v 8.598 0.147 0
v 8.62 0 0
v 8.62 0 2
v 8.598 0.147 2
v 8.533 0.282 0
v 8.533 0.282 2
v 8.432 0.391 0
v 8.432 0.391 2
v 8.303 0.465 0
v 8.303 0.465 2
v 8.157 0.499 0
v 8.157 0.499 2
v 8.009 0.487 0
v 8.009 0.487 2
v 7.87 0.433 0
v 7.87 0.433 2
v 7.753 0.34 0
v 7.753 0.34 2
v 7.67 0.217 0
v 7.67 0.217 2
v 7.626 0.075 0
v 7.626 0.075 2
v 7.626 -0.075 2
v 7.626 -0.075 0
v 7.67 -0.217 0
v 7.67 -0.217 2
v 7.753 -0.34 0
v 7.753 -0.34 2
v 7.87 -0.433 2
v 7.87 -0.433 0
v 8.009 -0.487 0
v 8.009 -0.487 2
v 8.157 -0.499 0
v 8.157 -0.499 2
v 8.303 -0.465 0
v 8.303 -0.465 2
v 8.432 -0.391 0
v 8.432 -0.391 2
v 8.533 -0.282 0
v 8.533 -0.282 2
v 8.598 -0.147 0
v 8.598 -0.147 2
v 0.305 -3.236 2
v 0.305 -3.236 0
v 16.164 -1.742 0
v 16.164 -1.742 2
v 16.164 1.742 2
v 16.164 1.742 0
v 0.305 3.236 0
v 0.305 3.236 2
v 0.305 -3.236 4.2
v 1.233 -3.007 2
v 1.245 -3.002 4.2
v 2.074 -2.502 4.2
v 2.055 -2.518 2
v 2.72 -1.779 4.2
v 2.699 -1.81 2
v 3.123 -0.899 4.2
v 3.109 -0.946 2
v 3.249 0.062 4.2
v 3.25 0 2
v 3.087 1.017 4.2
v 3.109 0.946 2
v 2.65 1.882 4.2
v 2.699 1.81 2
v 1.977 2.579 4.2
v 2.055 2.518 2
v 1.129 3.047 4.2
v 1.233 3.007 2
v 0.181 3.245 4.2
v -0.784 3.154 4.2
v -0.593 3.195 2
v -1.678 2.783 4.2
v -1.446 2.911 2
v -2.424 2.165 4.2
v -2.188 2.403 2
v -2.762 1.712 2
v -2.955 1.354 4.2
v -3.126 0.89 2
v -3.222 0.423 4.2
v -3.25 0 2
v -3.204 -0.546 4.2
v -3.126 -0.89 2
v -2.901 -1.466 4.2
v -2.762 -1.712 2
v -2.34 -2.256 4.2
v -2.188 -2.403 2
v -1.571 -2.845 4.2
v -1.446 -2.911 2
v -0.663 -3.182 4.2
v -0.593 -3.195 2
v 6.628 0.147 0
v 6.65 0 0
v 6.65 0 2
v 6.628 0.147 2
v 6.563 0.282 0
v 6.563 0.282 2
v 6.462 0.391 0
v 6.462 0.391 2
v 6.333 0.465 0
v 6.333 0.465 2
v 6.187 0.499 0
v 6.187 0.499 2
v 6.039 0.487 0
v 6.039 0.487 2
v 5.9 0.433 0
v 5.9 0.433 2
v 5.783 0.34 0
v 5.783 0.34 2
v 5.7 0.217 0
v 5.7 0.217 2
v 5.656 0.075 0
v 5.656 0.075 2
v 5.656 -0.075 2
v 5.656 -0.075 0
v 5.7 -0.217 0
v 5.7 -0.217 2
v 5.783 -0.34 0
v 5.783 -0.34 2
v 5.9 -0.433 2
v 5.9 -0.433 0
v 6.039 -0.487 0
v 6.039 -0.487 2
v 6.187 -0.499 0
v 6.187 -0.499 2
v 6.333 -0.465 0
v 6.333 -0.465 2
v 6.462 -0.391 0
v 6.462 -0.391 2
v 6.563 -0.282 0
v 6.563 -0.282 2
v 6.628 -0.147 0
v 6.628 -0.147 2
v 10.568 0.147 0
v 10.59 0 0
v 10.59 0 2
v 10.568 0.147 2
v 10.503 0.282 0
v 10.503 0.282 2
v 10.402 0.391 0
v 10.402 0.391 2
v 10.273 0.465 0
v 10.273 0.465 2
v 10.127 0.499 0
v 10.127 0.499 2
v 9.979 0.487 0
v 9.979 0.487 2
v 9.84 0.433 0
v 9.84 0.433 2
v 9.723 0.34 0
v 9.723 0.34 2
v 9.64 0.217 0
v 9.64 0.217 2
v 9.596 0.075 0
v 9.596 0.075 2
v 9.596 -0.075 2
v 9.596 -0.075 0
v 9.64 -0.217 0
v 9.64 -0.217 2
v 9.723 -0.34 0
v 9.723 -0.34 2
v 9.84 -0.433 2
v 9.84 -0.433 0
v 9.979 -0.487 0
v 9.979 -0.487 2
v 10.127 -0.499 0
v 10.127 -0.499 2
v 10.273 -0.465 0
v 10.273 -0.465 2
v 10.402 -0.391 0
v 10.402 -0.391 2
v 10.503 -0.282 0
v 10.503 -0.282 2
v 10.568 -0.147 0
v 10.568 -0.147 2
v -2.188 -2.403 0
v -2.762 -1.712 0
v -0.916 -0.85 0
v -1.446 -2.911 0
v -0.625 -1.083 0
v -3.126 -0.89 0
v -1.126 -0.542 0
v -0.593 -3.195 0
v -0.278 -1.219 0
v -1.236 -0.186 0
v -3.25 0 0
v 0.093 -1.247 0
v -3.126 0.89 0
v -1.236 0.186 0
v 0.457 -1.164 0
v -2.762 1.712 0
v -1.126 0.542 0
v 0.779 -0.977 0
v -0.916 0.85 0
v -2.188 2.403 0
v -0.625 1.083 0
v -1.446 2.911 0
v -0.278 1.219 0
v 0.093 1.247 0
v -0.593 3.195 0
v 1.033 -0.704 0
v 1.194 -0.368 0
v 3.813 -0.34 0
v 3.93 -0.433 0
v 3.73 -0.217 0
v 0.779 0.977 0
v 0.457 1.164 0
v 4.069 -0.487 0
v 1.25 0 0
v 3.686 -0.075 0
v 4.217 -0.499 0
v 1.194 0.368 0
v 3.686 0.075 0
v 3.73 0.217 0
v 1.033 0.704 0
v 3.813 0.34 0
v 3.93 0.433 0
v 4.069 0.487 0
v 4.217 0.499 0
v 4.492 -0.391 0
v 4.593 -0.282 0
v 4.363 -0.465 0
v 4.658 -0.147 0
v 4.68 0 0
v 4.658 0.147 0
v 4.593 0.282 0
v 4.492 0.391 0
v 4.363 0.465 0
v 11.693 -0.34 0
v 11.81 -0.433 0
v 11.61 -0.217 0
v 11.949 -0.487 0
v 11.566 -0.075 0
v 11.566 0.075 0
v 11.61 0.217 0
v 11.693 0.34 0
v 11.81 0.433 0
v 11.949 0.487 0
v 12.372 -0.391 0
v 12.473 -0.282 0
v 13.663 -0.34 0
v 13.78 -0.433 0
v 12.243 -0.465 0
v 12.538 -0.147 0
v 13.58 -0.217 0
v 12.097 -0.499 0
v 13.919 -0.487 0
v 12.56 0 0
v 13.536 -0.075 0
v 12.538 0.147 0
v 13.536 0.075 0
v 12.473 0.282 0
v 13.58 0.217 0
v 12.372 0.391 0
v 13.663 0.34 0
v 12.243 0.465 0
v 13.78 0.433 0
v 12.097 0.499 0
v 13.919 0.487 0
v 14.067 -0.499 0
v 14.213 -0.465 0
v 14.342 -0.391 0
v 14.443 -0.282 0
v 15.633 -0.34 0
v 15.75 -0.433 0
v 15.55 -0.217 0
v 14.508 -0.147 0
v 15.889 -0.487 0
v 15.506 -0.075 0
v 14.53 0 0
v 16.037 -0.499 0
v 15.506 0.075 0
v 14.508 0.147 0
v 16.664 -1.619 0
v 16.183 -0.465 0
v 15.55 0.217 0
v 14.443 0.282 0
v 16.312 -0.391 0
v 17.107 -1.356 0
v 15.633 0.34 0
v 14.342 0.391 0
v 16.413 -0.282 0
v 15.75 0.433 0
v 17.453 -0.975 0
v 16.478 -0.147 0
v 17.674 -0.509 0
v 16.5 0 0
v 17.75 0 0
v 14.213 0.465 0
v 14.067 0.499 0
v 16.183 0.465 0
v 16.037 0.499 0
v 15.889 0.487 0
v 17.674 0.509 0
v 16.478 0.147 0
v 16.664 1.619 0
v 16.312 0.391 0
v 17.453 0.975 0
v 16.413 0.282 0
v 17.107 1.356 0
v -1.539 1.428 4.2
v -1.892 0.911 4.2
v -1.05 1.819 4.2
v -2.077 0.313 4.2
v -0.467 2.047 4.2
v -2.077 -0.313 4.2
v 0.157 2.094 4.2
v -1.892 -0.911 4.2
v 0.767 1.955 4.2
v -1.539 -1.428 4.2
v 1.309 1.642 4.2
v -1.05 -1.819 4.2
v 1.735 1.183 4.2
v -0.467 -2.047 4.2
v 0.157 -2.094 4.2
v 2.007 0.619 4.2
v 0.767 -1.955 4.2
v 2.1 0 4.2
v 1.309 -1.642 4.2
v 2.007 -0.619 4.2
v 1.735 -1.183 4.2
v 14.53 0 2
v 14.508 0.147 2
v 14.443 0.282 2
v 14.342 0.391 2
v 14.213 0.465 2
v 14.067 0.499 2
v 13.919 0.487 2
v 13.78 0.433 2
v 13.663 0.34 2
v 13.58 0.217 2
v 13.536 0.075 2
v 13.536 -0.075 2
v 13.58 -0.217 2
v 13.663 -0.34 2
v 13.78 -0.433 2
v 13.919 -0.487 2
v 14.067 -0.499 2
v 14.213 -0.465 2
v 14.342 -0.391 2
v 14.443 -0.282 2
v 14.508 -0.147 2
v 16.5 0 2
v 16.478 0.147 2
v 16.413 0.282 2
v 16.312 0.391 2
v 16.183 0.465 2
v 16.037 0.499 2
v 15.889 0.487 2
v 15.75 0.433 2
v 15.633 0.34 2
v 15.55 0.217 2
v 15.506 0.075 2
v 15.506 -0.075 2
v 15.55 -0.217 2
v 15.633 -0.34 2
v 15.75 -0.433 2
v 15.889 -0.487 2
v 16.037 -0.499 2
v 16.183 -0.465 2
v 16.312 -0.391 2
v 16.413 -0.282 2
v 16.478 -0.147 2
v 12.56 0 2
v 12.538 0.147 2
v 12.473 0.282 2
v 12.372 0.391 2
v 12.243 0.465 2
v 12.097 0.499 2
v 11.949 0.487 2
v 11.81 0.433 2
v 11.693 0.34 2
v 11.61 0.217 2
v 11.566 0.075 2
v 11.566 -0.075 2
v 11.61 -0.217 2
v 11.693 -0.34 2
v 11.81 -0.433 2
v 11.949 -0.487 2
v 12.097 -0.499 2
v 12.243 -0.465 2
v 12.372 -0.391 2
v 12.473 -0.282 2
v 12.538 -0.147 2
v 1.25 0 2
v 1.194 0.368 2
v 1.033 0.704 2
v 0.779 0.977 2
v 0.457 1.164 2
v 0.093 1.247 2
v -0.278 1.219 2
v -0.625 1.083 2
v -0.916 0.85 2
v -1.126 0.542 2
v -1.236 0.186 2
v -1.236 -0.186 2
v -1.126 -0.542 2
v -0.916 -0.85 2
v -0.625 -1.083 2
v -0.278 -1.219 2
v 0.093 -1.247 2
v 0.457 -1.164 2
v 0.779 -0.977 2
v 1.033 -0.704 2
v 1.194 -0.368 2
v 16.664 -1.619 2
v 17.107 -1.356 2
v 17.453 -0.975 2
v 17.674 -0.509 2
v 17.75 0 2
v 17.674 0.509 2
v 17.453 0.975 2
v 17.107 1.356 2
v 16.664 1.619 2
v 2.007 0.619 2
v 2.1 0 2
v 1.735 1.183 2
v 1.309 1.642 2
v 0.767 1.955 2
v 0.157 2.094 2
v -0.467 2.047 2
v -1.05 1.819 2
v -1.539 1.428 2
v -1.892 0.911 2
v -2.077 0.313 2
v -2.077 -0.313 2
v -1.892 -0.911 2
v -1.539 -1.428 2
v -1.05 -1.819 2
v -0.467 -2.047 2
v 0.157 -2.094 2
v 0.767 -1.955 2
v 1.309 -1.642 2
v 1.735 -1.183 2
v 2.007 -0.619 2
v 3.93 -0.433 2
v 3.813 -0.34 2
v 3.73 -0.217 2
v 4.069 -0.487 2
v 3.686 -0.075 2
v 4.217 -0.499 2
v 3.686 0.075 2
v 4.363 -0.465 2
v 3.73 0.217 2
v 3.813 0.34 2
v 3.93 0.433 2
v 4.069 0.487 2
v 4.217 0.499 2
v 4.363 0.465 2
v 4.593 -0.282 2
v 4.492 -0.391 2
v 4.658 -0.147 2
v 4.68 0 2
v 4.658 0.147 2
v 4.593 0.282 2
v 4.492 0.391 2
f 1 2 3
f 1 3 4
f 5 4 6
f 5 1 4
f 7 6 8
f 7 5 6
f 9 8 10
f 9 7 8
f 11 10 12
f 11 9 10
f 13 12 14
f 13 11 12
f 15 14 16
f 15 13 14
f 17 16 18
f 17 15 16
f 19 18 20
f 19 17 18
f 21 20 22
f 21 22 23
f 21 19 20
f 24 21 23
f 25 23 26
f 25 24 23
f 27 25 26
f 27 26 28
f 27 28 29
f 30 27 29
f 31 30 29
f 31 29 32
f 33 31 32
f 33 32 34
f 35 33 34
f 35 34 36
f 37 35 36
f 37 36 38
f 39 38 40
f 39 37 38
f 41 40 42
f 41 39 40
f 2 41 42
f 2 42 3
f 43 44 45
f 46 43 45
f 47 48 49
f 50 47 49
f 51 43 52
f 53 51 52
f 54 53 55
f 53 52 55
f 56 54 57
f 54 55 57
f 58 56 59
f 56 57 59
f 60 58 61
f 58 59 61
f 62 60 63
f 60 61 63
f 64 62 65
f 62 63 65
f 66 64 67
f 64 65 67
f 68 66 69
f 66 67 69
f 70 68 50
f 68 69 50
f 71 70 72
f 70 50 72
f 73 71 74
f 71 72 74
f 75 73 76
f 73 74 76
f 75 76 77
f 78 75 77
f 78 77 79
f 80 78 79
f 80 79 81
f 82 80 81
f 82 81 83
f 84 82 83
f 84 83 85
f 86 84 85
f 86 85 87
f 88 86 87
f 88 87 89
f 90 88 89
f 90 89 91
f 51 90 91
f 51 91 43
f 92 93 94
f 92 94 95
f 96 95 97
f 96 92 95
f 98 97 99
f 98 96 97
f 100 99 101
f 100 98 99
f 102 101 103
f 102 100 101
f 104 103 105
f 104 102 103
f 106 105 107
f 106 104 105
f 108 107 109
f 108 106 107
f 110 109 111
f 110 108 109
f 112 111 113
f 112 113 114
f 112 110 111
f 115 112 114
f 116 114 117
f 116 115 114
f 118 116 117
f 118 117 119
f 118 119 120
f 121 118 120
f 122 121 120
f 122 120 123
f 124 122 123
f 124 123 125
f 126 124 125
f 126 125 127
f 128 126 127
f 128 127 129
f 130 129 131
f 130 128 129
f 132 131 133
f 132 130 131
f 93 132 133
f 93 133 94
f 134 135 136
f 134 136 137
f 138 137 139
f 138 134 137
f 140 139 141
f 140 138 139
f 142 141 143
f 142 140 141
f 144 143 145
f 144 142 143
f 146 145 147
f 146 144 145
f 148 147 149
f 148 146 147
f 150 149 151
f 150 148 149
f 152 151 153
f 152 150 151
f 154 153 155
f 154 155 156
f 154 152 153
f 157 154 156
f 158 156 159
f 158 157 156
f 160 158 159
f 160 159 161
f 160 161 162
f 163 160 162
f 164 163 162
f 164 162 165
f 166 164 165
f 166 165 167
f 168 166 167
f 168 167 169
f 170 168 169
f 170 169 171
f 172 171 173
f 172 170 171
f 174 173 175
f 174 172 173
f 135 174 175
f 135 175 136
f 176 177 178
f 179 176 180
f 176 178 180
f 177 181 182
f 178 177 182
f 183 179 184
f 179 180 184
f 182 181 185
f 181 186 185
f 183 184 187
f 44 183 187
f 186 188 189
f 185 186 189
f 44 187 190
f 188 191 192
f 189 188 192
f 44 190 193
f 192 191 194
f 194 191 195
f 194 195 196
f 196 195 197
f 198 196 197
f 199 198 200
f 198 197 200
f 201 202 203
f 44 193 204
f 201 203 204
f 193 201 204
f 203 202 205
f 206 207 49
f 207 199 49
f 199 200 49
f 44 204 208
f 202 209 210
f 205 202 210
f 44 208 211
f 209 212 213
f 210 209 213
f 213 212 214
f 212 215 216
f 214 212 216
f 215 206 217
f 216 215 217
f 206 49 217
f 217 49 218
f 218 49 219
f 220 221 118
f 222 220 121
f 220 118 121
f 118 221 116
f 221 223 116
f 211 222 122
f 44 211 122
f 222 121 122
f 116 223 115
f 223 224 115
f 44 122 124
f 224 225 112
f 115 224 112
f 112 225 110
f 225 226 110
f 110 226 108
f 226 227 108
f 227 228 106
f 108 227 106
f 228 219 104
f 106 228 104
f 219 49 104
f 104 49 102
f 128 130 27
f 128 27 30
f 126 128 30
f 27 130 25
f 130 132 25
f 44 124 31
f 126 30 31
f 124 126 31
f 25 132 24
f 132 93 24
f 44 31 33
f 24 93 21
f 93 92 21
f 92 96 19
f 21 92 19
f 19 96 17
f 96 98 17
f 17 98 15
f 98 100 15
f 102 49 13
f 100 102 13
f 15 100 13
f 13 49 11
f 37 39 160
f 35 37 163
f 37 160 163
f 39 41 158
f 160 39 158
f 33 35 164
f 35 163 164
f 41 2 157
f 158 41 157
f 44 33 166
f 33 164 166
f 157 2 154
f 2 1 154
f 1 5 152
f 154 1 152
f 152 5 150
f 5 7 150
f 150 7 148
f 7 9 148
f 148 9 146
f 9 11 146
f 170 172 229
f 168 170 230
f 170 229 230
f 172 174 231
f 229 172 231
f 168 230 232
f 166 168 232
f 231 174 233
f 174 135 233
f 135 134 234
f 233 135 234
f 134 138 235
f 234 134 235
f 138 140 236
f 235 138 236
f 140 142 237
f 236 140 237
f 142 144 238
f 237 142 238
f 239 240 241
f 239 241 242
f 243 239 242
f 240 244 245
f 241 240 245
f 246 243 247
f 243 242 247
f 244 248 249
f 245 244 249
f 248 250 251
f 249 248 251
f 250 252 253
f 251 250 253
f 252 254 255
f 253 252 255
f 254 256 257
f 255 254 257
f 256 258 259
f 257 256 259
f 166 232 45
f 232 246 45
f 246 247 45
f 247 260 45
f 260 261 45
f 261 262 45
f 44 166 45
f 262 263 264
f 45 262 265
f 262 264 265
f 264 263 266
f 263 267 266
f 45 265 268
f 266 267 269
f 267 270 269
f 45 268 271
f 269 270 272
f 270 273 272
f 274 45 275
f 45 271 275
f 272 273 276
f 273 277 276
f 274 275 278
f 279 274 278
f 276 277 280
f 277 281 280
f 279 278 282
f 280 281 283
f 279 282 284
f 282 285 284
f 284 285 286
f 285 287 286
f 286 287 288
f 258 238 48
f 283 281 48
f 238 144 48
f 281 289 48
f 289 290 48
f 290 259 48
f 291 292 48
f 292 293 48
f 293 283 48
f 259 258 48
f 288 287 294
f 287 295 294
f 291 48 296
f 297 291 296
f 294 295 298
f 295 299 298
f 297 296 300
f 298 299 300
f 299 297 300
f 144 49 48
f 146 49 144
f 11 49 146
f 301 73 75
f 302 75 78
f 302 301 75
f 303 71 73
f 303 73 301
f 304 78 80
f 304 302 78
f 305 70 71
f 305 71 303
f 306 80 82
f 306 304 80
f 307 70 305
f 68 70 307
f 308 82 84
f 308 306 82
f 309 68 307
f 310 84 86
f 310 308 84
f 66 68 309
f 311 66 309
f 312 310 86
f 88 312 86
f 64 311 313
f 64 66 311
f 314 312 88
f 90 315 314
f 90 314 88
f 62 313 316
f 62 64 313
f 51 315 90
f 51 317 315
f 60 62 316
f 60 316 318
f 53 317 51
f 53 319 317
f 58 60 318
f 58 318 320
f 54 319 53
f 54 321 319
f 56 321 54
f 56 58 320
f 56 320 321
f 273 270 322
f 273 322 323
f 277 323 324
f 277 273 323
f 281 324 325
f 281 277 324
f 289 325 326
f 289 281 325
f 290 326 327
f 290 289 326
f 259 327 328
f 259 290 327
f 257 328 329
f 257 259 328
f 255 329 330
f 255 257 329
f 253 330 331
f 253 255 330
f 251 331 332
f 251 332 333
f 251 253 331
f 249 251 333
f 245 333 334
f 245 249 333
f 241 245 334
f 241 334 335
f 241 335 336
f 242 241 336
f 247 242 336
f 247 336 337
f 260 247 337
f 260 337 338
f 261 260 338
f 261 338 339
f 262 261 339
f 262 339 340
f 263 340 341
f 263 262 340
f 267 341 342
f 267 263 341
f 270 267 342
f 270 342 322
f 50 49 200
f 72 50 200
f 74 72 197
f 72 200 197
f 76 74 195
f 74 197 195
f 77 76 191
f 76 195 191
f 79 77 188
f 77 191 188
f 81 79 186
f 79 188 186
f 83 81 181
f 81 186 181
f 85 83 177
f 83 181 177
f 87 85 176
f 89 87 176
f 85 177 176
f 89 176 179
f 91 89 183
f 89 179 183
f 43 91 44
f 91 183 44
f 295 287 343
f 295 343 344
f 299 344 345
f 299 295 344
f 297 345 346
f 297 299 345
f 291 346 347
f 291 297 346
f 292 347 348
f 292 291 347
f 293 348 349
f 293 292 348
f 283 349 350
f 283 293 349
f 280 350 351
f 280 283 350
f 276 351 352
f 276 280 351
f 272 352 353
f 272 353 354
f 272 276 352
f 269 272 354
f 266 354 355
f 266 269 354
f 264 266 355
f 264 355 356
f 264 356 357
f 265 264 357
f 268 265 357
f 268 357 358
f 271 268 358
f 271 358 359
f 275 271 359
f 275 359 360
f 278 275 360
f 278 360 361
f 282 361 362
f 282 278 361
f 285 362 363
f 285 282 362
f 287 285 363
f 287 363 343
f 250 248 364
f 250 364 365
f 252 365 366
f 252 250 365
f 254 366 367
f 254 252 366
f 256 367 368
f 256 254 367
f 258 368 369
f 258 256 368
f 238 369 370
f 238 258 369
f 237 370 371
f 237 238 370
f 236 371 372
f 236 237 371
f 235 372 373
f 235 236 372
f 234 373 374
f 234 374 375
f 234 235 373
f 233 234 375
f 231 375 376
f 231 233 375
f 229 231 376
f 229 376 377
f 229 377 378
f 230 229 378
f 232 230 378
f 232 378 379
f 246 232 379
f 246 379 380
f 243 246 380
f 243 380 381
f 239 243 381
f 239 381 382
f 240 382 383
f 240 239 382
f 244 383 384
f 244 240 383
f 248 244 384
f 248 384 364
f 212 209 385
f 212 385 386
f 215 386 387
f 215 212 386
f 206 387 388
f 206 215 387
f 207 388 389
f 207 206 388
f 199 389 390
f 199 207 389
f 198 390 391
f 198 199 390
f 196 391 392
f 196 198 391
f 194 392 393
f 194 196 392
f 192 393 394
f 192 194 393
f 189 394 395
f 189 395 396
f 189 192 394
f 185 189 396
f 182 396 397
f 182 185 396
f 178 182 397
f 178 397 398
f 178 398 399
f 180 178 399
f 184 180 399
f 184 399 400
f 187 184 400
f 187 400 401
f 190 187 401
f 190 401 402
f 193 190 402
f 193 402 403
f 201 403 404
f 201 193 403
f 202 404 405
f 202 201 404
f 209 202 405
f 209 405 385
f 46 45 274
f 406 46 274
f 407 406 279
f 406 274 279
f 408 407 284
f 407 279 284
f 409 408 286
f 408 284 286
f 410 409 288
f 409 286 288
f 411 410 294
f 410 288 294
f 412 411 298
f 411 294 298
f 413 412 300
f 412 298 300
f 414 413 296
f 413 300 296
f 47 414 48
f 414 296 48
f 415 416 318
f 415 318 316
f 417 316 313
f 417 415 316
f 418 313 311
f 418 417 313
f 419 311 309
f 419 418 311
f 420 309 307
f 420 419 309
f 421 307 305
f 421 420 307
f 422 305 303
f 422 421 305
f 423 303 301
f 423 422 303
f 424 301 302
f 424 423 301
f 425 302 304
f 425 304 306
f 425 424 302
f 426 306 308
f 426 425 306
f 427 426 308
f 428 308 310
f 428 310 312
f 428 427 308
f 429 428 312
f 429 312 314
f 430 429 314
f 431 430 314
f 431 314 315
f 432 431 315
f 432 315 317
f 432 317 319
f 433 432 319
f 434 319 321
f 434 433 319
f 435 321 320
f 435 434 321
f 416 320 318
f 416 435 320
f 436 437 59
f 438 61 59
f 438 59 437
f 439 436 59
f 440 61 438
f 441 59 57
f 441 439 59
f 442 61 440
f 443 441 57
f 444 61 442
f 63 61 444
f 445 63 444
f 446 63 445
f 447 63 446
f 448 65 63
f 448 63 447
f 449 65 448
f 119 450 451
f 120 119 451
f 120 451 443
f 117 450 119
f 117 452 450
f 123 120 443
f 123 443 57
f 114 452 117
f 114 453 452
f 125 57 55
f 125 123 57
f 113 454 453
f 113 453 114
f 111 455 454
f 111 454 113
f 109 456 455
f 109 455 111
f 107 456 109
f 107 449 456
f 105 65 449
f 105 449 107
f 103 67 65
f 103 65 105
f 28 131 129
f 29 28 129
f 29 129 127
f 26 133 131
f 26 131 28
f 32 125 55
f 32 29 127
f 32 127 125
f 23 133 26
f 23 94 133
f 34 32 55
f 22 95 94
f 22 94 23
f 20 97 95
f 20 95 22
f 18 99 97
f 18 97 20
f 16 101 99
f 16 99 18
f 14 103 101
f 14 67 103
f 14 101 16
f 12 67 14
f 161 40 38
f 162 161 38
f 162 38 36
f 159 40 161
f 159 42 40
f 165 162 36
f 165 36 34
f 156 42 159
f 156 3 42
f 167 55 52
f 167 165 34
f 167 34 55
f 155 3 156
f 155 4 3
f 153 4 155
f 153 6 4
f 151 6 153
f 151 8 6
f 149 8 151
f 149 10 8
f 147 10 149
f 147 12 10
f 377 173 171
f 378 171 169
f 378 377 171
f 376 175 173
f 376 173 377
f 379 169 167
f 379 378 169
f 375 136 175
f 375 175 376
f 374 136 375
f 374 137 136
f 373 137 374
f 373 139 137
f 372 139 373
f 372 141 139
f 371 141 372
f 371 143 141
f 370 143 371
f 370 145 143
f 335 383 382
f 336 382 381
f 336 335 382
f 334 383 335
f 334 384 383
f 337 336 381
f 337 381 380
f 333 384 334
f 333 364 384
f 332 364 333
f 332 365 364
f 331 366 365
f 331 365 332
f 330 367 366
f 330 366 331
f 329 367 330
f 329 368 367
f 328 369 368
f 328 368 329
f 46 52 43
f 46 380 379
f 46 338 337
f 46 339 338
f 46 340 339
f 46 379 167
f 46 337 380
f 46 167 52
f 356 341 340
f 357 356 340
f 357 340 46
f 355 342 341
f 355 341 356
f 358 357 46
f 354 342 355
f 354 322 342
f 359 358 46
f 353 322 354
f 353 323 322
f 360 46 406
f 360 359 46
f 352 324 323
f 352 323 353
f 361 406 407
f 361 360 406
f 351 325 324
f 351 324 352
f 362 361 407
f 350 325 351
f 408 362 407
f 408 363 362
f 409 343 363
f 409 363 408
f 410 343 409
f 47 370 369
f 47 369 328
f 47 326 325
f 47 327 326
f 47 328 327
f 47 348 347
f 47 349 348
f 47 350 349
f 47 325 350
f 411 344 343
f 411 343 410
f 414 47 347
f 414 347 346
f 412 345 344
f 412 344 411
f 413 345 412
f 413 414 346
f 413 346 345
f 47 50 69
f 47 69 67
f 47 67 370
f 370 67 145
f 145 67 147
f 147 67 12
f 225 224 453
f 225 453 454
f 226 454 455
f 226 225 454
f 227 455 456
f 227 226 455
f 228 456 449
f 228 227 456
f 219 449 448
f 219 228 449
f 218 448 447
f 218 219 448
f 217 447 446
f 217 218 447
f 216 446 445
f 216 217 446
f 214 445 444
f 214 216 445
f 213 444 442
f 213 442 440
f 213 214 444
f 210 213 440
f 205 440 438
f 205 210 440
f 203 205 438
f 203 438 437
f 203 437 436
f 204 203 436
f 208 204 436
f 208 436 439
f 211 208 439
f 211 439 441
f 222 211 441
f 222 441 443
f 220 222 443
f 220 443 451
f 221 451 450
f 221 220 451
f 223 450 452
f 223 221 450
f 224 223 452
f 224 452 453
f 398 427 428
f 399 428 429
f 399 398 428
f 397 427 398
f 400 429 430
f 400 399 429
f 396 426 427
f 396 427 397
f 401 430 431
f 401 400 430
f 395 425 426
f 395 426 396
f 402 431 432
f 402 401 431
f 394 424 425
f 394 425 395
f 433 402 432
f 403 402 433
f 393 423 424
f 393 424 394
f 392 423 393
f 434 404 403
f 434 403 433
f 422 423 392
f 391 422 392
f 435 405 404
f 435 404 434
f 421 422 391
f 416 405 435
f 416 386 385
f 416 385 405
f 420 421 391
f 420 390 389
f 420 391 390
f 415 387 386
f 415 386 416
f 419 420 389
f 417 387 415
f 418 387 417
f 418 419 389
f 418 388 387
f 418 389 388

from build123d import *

# Parameters (mm, degrees)
ESBO_O1_R                = 1.25
ESBO_O1_R_2              = 0.5
RESSALTO_EXTRUS_O1_DEPTH = 2
ESBO_O2_R                = 3.25
ESBO_O2_R_2              = 2.1
RESSALTO_EXTRUS_O2_DEPTH = 2.2


with BuildPart() as part:
    # Esboço1 → Ressalto-extrusão1 (new body)
    with BuildSketch(Plane.XY):
        with BuildLine():
            Line((16.1640625, 1.742292598), (0.3046875, 3.235686253))
            ThreePointArc((0.3046875, 3.235686253), (-3.25, 0), (0.3046875, -3.235686253))
            Line((0.3046875, -3.235686253), (16.1640625, -1.742292598))
            ThreePointArc((16.1640625, -1.742292598), (17.75, 0), (16.1640625, 1.742292598))
        make_face()
        Circle(ESBO_O1_R, mode=Mode.SUBTRACT)
        with Locations((16, 0)):
            Circle(ESBO_O1_R_2, mode=Mode.SUBTRACT)
        with Locations((14.03, 0)):
            Circle(ESBO_O1_R_2, mode=Mode.SUBTRACT)
        with Locations((12.06, 0)):
            Circle(ESBO_O1_R_2, mode=Mode.SUBTRACT)
        with Locations((10.09, 0)):
            Circle(ESBO_O1_R_2, mode=Mode.SUBTRACT)
        with Locations((8.12, 0)):
            Circle(ESBO_O1_R_2, mode=Mode.SUBTRACT)
        with Locations((6.15, 0)):
            Circle(ESBO_O1_R_2, mode=Mode.SUBTRACT)
        with Locations((4.18, 0)):
            Circle(ESBO_O1_R_2, mode=Mode.SUBTRACT)
    extrude(amount=RESSALTO_EXTRUS_O1_DEPTH)

    # Esboço2 → Ressalto-extrusão2 (add)
    with BuildSketch(Plane.XY.offset(2)):
        with Locations(Location((0, 0, 0), (0, 0, 275.379378991))):
            Circle(ESBO_O2_R)
        Circle(ESBO_O2_R_2, mode=Mode.SUBTRACT)
    extrude(amount=RESSALTO_EXTRUS_O2_DEPTH)


solid = part.part
